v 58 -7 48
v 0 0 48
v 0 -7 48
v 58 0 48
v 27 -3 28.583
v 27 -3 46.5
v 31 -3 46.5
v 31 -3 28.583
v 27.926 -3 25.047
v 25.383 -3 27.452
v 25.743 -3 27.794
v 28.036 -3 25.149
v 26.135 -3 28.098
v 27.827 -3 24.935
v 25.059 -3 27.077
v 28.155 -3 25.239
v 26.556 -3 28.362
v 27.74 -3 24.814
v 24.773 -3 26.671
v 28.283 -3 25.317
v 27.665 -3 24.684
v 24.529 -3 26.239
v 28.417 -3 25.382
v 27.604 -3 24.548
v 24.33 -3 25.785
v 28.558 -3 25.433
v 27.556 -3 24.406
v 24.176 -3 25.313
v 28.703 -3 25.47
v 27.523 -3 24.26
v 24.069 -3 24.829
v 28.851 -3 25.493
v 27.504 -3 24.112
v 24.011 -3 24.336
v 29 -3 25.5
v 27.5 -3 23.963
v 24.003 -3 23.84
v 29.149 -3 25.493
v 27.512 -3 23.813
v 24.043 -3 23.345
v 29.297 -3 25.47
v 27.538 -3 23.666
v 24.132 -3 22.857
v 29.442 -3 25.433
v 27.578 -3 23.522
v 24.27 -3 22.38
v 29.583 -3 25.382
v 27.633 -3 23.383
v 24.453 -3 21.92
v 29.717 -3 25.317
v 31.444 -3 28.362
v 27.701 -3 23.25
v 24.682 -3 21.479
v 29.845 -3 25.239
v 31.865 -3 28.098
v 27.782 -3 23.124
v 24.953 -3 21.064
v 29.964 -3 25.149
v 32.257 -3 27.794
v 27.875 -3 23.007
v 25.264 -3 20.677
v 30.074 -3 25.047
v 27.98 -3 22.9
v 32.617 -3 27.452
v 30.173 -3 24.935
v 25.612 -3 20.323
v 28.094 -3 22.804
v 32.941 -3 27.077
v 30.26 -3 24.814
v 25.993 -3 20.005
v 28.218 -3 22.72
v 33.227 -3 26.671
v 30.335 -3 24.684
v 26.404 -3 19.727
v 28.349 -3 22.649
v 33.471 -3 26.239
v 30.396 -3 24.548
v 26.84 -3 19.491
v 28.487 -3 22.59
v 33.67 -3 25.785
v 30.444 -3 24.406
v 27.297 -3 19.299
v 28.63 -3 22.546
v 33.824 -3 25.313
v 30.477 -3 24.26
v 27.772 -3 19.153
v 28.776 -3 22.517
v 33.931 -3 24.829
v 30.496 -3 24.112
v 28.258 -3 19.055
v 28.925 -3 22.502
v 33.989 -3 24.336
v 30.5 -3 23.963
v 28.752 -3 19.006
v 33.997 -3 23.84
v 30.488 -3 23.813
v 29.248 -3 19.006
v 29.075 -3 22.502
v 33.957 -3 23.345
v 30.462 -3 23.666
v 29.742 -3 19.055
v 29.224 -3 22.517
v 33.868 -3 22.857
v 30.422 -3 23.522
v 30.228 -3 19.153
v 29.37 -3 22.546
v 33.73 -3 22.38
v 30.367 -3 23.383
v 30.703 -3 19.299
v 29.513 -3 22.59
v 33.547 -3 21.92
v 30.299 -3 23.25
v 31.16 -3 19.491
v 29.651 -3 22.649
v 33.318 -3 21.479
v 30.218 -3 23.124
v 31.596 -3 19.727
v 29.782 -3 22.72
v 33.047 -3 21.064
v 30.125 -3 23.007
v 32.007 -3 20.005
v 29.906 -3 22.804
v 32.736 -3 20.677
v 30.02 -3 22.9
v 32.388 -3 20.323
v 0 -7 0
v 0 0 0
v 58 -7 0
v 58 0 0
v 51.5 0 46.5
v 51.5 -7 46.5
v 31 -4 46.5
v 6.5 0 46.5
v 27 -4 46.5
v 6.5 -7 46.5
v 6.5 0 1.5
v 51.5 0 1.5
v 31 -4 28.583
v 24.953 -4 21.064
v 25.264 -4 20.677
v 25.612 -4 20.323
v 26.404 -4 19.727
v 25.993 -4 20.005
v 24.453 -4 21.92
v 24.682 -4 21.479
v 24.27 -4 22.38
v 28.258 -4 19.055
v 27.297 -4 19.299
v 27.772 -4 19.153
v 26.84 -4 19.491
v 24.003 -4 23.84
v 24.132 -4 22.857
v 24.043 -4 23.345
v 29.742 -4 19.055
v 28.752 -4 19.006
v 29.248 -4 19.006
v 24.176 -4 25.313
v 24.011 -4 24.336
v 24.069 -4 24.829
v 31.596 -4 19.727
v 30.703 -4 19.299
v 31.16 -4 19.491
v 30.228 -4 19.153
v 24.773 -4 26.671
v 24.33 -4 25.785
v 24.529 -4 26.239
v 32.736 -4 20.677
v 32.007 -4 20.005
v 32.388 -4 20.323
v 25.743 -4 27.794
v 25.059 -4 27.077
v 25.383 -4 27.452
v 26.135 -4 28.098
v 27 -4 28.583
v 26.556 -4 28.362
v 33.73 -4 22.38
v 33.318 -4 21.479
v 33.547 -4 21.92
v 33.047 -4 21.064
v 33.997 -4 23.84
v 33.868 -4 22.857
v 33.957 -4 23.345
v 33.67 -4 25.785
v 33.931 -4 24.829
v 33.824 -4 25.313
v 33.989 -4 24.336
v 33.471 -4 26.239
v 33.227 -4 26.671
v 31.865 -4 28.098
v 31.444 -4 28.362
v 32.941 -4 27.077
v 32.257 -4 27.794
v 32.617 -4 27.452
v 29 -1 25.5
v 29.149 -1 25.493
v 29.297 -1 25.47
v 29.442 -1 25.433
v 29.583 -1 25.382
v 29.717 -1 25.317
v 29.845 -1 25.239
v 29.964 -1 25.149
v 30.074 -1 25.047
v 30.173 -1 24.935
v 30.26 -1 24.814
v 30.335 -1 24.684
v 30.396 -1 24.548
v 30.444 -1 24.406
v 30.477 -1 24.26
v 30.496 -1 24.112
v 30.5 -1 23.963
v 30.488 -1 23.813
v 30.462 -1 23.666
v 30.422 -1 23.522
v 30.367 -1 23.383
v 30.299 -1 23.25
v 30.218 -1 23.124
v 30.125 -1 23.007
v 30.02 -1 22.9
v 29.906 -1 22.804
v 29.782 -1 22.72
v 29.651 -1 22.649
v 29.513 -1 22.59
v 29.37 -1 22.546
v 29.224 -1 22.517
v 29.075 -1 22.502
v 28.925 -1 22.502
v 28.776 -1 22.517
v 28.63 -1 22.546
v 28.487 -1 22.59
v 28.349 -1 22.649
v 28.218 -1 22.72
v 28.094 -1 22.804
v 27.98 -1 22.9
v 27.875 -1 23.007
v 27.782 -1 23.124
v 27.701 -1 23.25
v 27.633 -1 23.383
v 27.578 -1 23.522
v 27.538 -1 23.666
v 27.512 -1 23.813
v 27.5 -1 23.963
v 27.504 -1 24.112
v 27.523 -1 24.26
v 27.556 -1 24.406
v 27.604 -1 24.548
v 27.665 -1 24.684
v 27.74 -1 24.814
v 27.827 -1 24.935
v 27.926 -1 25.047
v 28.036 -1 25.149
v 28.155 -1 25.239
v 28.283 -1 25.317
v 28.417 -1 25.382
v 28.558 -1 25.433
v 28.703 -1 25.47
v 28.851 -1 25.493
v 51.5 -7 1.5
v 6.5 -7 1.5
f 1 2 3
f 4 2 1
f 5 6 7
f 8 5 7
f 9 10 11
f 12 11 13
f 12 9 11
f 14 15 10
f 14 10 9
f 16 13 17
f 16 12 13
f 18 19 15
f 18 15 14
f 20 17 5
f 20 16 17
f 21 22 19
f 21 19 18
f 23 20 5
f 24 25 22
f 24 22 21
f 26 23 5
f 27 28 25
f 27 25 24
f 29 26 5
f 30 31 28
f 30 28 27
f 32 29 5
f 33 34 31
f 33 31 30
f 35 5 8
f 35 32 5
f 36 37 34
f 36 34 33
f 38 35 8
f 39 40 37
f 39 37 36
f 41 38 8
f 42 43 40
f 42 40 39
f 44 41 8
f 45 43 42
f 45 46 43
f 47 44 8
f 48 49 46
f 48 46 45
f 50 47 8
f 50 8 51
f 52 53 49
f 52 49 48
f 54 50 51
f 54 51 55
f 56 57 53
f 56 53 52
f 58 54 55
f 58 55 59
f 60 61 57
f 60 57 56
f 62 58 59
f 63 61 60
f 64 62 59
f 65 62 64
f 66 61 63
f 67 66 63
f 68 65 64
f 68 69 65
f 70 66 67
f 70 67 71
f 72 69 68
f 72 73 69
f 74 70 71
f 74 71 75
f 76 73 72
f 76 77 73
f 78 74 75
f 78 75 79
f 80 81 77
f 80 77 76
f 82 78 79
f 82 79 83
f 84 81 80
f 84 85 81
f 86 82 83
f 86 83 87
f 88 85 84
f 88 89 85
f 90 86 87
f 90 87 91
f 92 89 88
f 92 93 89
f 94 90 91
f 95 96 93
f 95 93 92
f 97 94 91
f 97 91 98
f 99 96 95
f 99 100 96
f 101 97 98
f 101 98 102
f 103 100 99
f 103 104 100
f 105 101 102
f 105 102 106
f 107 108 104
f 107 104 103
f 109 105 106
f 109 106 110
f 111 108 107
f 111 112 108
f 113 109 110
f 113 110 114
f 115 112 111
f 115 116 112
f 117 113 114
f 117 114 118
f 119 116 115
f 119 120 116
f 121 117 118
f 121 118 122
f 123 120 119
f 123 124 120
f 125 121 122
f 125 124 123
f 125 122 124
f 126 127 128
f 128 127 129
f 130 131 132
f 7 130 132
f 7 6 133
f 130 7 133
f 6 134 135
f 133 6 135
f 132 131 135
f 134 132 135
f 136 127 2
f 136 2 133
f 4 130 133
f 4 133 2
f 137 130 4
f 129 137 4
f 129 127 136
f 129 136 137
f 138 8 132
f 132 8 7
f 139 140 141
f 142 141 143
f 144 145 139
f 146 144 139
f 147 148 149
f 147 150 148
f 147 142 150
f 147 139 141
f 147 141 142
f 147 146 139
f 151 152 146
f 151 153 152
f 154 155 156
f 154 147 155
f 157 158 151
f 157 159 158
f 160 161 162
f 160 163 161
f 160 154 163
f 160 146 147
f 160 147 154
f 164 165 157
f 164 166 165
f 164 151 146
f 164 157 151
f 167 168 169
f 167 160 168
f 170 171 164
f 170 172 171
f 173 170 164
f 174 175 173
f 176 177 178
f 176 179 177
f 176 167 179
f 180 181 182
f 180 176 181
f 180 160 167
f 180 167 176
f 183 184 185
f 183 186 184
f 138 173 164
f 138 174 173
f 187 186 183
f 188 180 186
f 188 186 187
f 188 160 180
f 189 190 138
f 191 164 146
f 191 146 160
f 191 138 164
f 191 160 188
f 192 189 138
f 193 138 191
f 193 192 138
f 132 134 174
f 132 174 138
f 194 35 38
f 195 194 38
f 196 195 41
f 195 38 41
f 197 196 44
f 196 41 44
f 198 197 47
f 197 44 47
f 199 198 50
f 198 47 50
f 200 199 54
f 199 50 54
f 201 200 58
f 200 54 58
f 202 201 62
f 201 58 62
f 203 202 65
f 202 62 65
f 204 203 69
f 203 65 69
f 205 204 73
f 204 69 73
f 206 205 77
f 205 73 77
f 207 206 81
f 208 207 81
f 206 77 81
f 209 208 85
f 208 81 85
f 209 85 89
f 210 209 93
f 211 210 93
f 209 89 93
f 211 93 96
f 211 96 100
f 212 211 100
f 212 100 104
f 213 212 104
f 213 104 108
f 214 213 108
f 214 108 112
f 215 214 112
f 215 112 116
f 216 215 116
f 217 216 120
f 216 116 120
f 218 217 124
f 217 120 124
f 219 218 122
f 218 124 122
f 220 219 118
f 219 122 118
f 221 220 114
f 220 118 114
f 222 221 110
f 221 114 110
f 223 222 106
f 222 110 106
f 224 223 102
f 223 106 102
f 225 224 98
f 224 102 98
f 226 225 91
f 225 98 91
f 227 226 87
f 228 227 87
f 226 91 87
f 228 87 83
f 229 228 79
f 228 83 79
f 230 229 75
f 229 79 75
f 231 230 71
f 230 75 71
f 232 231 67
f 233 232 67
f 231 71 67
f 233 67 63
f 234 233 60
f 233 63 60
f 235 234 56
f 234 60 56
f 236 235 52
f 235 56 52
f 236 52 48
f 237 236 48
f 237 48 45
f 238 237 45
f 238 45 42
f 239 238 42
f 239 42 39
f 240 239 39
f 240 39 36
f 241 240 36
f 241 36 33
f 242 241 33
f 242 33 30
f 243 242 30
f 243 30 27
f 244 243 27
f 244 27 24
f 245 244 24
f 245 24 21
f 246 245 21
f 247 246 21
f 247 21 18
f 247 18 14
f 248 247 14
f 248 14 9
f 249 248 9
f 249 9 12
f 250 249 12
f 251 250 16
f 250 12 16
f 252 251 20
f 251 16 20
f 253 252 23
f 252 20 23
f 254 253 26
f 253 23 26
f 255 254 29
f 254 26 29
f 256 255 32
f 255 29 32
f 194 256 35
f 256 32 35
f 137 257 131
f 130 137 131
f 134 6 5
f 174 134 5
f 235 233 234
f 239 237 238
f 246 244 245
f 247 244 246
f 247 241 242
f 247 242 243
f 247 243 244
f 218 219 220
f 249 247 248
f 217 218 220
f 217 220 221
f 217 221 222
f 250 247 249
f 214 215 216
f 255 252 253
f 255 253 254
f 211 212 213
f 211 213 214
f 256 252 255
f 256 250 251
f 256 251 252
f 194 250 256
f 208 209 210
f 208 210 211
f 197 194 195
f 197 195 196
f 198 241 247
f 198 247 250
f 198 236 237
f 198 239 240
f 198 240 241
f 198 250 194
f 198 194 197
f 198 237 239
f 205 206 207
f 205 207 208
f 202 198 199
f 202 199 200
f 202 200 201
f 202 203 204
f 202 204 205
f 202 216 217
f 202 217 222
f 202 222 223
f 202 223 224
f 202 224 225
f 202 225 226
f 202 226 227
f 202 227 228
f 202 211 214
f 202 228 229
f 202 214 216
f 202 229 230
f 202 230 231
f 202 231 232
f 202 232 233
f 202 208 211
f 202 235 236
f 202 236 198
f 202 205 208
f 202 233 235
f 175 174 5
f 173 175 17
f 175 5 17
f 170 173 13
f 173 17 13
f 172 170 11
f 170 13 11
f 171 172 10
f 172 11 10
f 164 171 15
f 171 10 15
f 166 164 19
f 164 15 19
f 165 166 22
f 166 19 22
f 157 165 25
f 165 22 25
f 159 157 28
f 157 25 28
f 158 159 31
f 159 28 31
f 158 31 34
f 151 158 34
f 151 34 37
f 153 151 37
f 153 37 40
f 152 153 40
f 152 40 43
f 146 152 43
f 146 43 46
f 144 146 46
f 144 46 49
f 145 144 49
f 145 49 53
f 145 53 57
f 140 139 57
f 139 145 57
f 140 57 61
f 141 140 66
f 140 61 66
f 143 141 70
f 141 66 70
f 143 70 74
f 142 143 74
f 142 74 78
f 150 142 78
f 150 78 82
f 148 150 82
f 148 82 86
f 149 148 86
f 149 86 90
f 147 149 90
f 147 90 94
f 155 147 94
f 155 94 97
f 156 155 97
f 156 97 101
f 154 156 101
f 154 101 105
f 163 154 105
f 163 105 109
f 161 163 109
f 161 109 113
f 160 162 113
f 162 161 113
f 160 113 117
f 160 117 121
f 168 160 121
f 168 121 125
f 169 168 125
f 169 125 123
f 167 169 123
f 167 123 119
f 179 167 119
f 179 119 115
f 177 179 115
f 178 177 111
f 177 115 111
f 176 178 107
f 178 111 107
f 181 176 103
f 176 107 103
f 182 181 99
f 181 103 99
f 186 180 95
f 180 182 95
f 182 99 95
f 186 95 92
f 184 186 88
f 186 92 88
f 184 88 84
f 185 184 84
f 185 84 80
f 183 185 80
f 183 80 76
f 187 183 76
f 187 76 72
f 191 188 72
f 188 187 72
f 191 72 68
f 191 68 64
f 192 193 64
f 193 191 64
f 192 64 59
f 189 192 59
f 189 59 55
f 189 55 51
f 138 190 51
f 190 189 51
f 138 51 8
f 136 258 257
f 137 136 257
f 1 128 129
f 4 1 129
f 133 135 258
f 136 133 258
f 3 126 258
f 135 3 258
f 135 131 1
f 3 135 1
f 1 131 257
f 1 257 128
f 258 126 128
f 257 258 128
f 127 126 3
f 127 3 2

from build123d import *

# Parameters (mm, degrees)
SKETCH1_W           = 58
SKETCH1_H           = 7
BOSS_EXTRUDE1_DEPTH = 48
CUT_EXTRUDE1_DEPTH  = 3
CUT_EXTRUDE2_DEPTH  = 3
CUT_EXTRUDE3_DEPTH  = 3
SKETCH6_R           = 1.5
BOSS_EXTRUDE2_DEPTH = 2


with BuildPart() as part:
    # Sketch1 → Boss-Extrude1 (new body)
    with BuildSketch(Plane.XY):
        with Locations((29, -3.5)):
            Rectangle(SKETCH1_W, SKETCH1_H)
    extrude(amount=BOSS_EXTRUDE1_DEPTH)

    # Sketch2 → Cut-Extrude1 (cut)
    with BuildSketch(Plane(origin=(0, 0, 0), x_dir=(1, 0, 0), z_dir=(0, 1, 0))):
        Polygon((51.5, -42.620689655), (6.5, -5.379310345), (6.5, -46.5), (51.5, -46.5), align=None)
        Polygon((6.5, -1.5), (6.5, -5.379310345), (51.5, -42.620689655), (51.5, -1.5), align=None)
    extrude(amount=-CUT_EXTRUDE1_DEPTH, mode=Mode.SUBTRACT)

    # Sketch4 → Cut-Extrude2 (cut)
    with BuildSketch(Plane.XZ.offset(7)):
        Polygon((51.5, 5.379310345), (29, 24), (6.5, 5.379310345), (6.5, 1.5), (51.5, 1.5), align=None)
        Polygon((51.5, 42.620689655), (29, 24), (51.5, 5.379310345), align=None)
        Polygon((6.5, 46.5), (6.5, 42.620689655), (29, 24), (51.5, 42.620689655), (51.5, 46.5), align=None)
        Polygon((29, 24), (6.5, 42.620689655), (6.5, 5.379310345), align=None)
    extrude(amount=-CUT_EXTRUDE2_DEPTH, mode=Mode.SUBTRACT)

    # Sketch5 → Cut-Extrude3 (cut)
    with BuildSketch(Plane(origin=(0, -3, 0), x_dir=(1, 0, 0), z_dir=(0, 1, 0))):
        with BuildLine():
            Line((51.5, -1.5), (6.5, -1.5))
            Line((6.5, -1.5), (6.5, -46.5))
            Line((6.5, -46.5), (27, -46.5))
            Line((27, -46.5), (27, -28.582575695))
            ThreePointArc((27, -28.582575695), (29, -19), (31, -28.582575695))
            Line((31, -28.582575695), (31, -46.5))
            Line((31, -46.5), (51.5, -46.5))
            Line((51.5, -46.5), (51.5, -1.5))
        make_face()
    extrude(amount=-CUT_EXTRUDE3_DEPTH, mode=Mode.SUBTRACT)

    # Sketch6 → Boss-Extrude2 (add)
    with BuildSketch(Plane(origin=(0, -3, 0), x_dir=(1, 0, 0), z_dir=(0, 1, 0))):
        with Locations(Location((29, -24, 0), (0, 0, 270))):
            Circle(SKETCH6_R)
    extrude(amount=BOSS_EXTRUDE2_DEPTH)


solid = part.part
